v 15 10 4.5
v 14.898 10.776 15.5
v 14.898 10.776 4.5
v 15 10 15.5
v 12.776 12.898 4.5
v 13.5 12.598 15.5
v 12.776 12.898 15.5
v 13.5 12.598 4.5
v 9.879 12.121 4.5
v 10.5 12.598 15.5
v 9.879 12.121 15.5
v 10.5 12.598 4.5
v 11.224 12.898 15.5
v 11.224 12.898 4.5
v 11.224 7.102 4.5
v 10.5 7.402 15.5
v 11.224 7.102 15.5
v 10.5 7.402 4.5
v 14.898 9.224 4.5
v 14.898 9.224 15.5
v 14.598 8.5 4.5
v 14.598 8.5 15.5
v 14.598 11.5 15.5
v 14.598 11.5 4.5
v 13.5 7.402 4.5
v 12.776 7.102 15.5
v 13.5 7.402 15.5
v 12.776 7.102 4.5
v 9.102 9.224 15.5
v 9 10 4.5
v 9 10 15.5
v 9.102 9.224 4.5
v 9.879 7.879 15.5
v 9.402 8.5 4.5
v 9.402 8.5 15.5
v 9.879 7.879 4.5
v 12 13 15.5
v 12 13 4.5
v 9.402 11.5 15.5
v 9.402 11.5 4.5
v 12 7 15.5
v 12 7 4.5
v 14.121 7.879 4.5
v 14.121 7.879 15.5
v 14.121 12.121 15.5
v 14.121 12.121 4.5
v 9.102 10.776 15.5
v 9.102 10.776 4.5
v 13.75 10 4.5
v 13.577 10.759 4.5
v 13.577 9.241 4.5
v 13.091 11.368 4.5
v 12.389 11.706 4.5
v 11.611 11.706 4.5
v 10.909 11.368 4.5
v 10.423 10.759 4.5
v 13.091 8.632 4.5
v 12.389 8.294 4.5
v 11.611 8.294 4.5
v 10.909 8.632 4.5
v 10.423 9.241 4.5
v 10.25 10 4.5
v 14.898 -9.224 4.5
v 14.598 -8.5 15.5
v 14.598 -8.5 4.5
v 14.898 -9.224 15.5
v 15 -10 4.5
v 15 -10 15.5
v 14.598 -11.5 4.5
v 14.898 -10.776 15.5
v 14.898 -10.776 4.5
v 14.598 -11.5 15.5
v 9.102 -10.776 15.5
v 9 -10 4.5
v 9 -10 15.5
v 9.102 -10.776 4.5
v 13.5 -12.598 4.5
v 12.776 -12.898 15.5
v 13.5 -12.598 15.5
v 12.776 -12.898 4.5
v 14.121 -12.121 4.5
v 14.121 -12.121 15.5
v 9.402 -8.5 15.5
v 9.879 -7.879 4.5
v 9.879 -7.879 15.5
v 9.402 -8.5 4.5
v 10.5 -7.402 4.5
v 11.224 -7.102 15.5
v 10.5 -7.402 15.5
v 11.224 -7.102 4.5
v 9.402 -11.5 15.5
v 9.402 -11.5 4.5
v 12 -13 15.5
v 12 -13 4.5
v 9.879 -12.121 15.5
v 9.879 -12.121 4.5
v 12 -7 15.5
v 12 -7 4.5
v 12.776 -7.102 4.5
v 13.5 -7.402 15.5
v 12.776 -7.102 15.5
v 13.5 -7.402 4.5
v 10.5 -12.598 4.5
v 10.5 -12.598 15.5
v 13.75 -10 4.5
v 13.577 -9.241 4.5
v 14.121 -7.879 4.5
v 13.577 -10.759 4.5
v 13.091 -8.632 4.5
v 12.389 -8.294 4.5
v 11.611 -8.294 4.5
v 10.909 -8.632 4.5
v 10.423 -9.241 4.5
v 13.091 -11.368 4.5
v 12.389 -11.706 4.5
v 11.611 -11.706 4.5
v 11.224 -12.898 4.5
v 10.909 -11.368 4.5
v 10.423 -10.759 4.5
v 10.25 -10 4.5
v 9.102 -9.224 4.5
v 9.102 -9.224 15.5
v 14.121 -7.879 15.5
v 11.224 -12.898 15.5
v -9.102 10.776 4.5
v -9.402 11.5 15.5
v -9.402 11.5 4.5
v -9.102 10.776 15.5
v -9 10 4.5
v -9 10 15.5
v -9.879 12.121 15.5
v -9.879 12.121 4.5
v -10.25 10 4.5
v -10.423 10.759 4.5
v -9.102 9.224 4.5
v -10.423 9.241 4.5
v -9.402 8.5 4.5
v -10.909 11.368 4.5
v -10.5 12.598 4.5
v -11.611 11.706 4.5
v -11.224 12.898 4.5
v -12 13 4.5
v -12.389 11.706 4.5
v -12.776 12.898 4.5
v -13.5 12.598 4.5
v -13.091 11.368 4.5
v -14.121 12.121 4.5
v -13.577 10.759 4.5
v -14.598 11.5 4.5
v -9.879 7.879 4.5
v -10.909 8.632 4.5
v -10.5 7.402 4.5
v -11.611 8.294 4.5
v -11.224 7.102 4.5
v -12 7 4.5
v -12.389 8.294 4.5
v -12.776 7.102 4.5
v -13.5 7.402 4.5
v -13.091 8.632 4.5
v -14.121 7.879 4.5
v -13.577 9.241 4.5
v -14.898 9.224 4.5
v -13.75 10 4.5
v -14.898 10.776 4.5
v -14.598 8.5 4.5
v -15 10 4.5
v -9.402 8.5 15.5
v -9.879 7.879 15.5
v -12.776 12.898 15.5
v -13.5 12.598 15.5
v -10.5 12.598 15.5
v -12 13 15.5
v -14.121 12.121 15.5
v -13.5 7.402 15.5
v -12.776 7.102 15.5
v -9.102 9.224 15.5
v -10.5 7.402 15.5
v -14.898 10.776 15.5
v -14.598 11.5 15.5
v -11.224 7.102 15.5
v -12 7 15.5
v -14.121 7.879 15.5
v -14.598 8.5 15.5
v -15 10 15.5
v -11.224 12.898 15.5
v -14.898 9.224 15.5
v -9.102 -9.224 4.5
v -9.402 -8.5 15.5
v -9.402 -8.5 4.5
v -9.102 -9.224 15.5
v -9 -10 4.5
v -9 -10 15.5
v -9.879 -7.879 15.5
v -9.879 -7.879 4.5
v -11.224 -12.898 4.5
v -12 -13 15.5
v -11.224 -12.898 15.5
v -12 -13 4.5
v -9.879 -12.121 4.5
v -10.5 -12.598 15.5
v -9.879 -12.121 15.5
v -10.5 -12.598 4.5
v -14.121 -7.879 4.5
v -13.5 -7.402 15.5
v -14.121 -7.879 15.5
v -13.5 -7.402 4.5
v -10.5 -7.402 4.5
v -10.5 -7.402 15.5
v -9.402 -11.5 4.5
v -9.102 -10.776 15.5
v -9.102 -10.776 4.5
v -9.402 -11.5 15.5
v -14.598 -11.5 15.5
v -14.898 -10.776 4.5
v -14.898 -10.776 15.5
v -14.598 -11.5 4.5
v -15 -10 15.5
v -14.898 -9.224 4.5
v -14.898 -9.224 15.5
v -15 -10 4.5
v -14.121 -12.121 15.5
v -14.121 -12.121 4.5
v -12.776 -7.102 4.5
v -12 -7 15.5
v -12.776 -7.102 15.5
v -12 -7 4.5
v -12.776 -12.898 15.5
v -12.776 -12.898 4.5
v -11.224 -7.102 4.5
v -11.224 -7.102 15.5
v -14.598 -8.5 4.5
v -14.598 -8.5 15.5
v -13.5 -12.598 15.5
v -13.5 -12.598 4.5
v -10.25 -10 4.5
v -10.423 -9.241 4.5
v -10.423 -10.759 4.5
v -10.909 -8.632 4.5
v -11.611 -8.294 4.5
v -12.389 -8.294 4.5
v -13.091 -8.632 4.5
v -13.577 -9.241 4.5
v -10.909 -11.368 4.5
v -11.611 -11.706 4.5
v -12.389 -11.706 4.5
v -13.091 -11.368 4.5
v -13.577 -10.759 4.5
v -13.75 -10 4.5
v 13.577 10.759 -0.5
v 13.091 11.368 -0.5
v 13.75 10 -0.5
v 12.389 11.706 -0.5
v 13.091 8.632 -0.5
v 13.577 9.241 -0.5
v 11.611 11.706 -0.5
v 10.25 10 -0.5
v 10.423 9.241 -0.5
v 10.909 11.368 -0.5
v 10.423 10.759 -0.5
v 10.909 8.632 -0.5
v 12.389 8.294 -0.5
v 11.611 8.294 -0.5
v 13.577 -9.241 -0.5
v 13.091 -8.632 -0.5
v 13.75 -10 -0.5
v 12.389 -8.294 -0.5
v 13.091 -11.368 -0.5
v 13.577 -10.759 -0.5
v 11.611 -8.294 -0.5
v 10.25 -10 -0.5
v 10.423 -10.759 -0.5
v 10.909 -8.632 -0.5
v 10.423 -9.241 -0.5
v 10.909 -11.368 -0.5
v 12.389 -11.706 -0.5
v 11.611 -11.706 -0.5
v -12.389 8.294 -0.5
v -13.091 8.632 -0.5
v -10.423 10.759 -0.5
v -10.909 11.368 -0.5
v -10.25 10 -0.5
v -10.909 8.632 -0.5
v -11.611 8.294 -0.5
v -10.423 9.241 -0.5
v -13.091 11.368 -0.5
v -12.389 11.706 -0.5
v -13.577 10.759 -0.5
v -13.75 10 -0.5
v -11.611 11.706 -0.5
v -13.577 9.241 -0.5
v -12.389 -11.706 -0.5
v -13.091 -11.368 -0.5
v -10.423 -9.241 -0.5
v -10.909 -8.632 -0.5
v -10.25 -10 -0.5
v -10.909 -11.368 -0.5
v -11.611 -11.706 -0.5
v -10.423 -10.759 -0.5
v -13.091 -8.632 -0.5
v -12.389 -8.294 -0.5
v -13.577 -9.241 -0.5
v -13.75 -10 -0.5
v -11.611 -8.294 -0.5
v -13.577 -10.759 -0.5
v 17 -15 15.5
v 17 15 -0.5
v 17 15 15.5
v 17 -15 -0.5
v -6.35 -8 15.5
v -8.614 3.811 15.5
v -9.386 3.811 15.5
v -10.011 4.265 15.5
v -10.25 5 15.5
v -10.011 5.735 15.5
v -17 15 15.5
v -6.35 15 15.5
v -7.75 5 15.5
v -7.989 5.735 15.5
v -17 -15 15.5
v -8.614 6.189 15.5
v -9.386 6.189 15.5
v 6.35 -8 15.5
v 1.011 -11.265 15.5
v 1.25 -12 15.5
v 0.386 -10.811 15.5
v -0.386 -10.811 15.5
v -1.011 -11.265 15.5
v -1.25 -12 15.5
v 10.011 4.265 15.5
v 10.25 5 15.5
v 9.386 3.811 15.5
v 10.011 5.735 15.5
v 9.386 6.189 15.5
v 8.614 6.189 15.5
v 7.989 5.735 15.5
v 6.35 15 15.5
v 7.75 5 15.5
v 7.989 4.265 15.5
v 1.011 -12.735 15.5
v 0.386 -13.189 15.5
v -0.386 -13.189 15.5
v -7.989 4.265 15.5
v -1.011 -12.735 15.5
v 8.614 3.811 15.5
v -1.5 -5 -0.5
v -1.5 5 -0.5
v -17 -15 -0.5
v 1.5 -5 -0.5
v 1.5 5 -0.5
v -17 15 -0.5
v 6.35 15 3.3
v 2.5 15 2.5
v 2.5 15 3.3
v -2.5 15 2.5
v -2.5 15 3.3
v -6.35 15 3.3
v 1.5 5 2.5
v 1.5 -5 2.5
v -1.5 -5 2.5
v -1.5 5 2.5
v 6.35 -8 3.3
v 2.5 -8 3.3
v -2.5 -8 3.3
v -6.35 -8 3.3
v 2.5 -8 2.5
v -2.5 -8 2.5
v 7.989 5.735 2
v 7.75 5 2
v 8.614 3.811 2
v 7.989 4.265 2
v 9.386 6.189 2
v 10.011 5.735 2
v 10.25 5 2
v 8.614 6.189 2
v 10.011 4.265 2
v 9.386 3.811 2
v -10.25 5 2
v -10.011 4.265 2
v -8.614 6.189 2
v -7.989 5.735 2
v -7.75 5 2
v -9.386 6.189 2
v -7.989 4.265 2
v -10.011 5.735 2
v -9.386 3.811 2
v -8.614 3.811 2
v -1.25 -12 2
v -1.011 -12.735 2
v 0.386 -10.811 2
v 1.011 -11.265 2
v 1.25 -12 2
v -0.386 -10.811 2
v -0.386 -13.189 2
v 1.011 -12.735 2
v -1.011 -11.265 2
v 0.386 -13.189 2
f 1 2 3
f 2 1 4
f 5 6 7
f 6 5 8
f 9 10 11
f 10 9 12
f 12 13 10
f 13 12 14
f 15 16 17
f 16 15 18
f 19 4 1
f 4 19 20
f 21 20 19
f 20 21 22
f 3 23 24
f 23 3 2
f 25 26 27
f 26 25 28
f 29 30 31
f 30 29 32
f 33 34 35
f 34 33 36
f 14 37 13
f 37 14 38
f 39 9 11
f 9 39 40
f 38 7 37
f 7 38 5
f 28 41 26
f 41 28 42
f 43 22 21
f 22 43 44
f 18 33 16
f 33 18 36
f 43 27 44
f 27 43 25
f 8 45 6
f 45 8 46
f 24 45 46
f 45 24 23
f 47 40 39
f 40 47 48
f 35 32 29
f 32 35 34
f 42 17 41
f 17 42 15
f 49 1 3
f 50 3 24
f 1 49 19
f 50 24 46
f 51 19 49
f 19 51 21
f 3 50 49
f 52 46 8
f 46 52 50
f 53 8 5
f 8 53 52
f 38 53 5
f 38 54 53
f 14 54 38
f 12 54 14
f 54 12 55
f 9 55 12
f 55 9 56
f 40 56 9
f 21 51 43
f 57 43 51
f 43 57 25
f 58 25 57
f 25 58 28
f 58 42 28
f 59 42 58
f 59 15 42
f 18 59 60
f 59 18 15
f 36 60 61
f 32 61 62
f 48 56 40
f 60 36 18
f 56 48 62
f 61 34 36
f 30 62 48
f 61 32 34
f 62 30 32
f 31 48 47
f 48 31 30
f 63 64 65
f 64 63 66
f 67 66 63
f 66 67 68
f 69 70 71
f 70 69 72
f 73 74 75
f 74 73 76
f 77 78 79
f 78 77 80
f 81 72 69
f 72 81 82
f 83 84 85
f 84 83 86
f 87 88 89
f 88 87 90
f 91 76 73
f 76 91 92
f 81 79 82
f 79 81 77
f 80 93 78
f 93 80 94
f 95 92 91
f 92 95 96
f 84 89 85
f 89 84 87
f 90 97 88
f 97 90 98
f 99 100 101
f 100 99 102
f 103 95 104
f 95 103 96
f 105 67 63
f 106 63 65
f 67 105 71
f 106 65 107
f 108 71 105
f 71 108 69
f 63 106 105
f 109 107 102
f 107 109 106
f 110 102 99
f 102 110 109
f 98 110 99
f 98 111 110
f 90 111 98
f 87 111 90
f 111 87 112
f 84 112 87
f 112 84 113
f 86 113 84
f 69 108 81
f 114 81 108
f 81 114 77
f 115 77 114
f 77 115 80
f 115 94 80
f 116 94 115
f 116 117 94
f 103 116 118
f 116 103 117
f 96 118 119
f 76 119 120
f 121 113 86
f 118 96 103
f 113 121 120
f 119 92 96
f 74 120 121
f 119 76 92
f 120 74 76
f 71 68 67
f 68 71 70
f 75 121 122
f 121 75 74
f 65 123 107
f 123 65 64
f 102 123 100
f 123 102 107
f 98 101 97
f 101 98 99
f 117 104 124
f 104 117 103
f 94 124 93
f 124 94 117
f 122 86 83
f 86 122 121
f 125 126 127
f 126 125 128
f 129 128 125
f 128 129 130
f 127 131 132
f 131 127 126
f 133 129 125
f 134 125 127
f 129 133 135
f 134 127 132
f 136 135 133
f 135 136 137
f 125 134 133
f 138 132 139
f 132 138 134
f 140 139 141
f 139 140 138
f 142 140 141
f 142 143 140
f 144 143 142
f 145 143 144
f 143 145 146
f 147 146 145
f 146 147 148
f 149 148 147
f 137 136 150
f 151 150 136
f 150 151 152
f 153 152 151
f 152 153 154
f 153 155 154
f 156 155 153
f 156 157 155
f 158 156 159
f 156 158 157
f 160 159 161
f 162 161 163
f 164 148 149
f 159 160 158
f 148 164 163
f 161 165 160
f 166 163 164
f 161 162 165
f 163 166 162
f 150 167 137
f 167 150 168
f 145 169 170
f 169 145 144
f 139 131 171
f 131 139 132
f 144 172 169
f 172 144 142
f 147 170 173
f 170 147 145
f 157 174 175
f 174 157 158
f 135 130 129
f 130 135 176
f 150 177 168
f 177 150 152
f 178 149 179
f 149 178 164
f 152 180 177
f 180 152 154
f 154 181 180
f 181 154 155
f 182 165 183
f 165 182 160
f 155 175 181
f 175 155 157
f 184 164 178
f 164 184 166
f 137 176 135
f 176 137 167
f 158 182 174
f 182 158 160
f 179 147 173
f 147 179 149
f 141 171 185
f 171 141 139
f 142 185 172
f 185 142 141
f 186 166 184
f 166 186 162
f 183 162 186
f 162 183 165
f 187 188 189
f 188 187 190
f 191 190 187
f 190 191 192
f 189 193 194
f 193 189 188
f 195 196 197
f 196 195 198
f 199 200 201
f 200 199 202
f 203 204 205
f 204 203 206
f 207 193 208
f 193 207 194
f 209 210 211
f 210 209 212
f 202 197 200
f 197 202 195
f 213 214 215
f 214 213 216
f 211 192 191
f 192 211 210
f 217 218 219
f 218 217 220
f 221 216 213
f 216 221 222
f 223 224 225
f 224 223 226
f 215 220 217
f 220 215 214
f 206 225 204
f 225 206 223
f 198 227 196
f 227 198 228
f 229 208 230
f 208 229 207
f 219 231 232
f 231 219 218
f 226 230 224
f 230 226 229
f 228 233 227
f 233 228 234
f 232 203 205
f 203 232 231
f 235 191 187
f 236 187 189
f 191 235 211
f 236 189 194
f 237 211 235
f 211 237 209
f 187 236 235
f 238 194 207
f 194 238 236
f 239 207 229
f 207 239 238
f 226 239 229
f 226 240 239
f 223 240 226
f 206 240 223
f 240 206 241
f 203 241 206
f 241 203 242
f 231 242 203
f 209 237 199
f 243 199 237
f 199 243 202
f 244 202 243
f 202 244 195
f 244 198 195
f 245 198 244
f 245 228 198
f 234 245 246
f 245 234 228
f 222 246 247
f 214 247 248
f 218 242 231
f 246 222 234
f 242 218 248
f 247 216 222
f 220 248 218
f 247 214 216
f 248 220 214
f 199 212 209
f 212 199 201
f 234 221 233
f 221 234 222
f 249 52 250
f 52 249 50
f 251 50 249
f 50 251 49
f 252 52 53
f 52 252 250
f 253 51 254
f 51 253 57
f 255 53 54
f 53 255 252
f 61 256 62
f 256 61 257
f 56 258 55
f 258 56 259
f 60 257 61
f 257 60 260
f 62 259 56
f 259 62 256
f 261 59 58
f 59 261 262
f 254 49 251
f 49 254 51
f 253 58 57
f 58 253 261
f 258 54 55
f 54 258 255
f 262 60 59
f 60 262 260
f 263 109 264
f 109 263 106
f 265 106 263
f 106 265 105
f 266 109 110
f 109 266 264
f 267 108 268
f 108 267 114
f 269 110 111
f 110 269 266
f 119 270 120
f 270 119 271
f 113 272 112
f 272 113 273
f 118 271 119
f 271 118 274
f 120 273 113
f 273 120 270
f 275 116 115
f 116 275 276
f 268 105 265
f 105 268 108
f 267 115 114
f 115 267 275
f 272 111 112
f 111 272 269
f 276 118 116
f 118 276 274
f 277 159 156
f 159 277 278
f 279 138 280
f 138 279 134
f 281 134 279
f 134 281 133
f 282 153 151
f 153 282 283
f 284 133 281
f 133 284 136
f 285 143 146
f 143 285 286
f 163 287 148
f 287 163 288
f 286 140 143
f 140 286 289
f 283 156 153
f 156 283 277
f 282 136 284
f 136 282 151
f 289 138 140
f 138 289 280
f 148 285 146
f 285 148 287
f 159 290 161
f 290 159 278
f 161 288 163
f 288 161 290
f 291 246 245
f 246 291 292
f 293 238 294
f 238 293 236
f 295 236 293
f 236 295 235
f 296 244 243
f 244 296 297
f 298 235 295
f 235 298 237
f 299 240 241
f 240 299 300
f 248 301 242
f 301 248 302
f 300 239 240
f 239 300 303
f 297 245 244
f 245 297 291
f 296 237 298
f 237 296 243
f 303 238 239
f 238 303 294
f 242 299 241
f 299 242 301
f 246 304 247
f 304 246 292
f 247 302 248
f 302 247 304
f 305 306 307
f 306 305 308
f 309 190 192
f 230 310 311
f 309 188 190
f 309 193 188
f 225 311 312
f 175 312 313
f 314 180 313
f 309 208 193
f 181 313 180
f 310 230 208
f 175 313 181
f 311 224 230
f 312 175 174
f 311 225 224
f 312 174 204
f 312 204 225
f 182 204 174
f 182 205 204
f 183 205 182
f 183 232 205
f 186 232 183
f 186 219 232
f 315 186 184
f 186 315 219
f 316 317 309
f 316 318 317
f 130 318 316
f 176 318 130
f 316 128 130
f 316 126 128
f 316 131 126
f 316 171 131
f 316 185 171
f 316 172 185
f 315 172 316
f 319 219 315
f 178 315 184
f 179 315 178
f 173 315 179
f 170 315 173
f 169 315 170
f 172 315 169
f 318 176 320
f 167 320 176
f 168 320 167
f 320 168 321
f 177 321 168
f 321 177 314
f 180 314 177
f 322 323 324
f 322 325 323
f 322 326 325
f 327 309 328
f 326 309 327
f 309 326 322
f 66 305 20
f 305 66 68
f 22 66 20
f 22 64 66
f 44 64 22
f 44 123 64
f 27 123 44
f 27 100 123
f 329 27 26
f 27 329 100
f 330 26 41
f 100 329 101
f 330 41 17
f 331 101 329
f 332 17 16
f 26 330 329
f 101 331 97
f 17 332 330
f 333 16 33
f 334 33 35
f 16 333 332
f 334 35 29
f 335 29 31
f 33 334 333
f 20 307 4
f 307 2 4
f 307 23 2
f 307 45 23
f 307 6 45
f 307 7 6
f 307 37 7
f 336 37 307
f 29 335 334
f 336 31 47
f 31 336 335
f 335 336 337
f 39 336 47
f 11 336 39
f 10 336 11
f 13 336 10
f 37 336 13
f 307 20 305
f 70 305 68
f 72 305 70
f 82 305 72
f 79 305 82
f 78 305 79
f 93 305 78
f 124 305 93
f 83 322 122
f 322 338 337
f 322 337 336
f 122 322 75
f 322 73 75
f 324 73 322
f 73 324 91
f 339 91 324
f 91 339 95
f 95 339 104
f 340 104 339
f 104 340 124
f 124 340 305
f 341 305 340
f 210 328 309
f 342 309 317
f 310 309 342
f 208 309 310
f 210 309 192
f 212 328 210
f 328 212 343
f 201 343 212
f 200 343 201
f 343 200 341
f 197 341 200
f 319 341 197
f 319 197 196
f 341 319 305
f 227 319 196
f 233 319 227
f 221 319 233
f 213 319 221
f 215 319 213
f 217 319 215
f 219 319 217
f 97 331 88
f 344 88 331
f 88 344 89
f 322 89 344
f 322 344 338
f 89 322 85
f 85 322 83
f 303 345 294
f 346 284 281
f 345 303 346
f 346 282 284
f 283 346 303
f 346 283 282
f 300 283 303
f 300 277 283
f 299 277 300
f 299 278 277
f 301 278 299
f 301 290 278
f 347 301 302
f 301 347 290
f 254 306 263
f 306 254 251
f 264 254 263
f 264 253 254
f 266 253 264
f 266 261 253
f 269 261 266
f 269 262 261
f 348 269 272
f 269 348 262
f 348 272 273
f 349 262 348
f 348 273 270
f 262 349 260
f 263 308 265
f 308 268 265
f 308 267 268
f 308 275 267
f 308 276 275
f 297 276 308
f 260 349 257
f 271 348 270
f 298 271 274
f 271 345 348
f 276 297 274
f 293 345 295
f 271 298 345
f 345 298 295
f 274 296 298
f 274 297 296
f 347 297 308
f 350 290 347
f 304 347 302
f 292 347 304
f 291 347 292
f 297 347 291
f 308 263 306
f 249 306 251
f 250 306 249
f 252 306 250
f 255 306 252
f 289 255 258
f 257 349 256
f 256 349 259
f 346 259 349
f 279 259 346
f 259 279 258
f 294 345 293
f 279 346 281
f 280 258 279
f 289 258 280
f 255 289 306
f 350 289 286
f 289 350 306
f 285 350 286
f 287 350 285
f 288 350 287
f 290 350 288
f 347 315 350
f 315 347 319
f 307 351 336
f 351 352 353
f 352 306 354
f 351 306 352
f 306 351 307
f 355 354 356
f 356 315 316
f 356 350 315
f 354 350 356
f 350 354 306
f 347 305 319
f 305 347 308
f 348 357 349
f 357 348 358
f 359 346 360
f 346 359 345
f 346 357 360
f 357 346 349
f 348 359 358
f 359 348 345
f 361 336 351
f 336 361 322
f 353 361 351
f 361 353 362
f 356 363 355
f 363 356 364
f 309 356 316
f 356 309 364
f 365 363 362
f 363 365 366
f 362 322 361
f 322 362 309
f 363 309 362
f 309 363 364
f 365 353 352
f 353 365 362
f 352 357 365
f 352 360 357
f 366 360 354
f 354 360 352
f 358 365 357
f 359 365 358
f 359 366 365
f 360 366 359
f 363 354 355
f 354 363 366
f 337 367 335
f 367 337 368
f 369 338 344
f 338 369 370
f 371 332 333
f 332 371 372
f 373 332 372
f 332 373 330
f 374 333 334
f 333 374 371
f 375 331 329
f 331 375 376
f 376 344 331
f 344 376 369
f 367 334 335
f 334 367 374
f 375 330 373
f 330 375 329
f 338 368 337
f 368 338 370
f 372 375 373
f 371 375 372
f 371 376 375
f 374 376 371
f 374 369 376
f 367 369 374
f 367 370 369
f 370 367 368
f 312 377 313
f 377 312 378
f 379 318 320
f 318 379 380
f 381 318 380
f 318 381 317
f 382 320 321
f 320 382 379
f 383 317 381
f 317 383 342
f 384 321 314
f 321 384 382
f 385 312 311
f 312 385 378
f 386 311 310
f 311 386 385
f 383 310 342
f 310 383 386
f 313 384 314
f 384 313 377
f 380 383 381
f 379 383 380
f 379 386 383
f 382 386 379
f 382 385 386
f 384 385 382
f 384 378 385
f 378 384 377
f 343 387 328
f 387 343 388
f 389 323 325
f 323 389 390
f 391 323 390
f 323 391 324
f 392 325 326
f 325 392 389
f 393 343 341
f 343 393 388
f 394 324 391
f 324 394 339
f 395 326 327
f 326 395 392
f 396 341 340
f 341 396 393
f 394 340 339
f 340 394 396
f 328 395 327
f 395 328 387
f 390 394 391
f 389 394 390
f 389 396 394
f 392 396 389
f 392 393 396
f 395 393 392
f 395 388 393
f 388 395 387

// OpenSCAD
/******************************
*  Cuvette mount, inner                     *
*     need to confirm dimensions of cuvette *
*****************************/

cuvSize = 12.7;  // size of cuvette
size = [34,30,16];
xy = [1,-1];
holeDia = [2.5,3.5,6]; 
$fa = 6;  // make holes roundish
$fs = 0.8;
//  note: fourHole method changed from original:
//    module set to make holes in xy not xz
//    hole depth set
module fourHole(x, y, dia,depth){   // method for creating four hole pattern
for(a = [0:1],b=[0:1]){
  translate([x/2*xy[a],y/2*xy[b], depth+2])
//    rotate([90,0,0])
   cylinder(2*depth+1,d=dia,center = true);
}    
}

difference(){
    translate([0,0,7.5])
    cube(size, center = true);
    cube([3,10,10],center = true);  // through hole
    translate([0,7,size[2]])
    cube([cuvSize,30,cuvSize*2],center = true);  // main cuvette
   translate([0,7,13])
    cube([5,30,21],center = true);  //  groove to keep from scratching 
    translate([0,0,3])
    fourHole(24,20,holeDia[2],6);
    translate([0,0,-4])
    fourHole(24,20,holeDia[1],8);
    translate([9,5,9])
    cylinder(14,d = holeDia[0], center = true);
    translate([-9,5,9])
    cylinder(14,d = holeDia[0], center = true);
    translate([0,-12,9])
    cylinder(14,d = holeDia[0], center = true);
    
}  // end of difference
